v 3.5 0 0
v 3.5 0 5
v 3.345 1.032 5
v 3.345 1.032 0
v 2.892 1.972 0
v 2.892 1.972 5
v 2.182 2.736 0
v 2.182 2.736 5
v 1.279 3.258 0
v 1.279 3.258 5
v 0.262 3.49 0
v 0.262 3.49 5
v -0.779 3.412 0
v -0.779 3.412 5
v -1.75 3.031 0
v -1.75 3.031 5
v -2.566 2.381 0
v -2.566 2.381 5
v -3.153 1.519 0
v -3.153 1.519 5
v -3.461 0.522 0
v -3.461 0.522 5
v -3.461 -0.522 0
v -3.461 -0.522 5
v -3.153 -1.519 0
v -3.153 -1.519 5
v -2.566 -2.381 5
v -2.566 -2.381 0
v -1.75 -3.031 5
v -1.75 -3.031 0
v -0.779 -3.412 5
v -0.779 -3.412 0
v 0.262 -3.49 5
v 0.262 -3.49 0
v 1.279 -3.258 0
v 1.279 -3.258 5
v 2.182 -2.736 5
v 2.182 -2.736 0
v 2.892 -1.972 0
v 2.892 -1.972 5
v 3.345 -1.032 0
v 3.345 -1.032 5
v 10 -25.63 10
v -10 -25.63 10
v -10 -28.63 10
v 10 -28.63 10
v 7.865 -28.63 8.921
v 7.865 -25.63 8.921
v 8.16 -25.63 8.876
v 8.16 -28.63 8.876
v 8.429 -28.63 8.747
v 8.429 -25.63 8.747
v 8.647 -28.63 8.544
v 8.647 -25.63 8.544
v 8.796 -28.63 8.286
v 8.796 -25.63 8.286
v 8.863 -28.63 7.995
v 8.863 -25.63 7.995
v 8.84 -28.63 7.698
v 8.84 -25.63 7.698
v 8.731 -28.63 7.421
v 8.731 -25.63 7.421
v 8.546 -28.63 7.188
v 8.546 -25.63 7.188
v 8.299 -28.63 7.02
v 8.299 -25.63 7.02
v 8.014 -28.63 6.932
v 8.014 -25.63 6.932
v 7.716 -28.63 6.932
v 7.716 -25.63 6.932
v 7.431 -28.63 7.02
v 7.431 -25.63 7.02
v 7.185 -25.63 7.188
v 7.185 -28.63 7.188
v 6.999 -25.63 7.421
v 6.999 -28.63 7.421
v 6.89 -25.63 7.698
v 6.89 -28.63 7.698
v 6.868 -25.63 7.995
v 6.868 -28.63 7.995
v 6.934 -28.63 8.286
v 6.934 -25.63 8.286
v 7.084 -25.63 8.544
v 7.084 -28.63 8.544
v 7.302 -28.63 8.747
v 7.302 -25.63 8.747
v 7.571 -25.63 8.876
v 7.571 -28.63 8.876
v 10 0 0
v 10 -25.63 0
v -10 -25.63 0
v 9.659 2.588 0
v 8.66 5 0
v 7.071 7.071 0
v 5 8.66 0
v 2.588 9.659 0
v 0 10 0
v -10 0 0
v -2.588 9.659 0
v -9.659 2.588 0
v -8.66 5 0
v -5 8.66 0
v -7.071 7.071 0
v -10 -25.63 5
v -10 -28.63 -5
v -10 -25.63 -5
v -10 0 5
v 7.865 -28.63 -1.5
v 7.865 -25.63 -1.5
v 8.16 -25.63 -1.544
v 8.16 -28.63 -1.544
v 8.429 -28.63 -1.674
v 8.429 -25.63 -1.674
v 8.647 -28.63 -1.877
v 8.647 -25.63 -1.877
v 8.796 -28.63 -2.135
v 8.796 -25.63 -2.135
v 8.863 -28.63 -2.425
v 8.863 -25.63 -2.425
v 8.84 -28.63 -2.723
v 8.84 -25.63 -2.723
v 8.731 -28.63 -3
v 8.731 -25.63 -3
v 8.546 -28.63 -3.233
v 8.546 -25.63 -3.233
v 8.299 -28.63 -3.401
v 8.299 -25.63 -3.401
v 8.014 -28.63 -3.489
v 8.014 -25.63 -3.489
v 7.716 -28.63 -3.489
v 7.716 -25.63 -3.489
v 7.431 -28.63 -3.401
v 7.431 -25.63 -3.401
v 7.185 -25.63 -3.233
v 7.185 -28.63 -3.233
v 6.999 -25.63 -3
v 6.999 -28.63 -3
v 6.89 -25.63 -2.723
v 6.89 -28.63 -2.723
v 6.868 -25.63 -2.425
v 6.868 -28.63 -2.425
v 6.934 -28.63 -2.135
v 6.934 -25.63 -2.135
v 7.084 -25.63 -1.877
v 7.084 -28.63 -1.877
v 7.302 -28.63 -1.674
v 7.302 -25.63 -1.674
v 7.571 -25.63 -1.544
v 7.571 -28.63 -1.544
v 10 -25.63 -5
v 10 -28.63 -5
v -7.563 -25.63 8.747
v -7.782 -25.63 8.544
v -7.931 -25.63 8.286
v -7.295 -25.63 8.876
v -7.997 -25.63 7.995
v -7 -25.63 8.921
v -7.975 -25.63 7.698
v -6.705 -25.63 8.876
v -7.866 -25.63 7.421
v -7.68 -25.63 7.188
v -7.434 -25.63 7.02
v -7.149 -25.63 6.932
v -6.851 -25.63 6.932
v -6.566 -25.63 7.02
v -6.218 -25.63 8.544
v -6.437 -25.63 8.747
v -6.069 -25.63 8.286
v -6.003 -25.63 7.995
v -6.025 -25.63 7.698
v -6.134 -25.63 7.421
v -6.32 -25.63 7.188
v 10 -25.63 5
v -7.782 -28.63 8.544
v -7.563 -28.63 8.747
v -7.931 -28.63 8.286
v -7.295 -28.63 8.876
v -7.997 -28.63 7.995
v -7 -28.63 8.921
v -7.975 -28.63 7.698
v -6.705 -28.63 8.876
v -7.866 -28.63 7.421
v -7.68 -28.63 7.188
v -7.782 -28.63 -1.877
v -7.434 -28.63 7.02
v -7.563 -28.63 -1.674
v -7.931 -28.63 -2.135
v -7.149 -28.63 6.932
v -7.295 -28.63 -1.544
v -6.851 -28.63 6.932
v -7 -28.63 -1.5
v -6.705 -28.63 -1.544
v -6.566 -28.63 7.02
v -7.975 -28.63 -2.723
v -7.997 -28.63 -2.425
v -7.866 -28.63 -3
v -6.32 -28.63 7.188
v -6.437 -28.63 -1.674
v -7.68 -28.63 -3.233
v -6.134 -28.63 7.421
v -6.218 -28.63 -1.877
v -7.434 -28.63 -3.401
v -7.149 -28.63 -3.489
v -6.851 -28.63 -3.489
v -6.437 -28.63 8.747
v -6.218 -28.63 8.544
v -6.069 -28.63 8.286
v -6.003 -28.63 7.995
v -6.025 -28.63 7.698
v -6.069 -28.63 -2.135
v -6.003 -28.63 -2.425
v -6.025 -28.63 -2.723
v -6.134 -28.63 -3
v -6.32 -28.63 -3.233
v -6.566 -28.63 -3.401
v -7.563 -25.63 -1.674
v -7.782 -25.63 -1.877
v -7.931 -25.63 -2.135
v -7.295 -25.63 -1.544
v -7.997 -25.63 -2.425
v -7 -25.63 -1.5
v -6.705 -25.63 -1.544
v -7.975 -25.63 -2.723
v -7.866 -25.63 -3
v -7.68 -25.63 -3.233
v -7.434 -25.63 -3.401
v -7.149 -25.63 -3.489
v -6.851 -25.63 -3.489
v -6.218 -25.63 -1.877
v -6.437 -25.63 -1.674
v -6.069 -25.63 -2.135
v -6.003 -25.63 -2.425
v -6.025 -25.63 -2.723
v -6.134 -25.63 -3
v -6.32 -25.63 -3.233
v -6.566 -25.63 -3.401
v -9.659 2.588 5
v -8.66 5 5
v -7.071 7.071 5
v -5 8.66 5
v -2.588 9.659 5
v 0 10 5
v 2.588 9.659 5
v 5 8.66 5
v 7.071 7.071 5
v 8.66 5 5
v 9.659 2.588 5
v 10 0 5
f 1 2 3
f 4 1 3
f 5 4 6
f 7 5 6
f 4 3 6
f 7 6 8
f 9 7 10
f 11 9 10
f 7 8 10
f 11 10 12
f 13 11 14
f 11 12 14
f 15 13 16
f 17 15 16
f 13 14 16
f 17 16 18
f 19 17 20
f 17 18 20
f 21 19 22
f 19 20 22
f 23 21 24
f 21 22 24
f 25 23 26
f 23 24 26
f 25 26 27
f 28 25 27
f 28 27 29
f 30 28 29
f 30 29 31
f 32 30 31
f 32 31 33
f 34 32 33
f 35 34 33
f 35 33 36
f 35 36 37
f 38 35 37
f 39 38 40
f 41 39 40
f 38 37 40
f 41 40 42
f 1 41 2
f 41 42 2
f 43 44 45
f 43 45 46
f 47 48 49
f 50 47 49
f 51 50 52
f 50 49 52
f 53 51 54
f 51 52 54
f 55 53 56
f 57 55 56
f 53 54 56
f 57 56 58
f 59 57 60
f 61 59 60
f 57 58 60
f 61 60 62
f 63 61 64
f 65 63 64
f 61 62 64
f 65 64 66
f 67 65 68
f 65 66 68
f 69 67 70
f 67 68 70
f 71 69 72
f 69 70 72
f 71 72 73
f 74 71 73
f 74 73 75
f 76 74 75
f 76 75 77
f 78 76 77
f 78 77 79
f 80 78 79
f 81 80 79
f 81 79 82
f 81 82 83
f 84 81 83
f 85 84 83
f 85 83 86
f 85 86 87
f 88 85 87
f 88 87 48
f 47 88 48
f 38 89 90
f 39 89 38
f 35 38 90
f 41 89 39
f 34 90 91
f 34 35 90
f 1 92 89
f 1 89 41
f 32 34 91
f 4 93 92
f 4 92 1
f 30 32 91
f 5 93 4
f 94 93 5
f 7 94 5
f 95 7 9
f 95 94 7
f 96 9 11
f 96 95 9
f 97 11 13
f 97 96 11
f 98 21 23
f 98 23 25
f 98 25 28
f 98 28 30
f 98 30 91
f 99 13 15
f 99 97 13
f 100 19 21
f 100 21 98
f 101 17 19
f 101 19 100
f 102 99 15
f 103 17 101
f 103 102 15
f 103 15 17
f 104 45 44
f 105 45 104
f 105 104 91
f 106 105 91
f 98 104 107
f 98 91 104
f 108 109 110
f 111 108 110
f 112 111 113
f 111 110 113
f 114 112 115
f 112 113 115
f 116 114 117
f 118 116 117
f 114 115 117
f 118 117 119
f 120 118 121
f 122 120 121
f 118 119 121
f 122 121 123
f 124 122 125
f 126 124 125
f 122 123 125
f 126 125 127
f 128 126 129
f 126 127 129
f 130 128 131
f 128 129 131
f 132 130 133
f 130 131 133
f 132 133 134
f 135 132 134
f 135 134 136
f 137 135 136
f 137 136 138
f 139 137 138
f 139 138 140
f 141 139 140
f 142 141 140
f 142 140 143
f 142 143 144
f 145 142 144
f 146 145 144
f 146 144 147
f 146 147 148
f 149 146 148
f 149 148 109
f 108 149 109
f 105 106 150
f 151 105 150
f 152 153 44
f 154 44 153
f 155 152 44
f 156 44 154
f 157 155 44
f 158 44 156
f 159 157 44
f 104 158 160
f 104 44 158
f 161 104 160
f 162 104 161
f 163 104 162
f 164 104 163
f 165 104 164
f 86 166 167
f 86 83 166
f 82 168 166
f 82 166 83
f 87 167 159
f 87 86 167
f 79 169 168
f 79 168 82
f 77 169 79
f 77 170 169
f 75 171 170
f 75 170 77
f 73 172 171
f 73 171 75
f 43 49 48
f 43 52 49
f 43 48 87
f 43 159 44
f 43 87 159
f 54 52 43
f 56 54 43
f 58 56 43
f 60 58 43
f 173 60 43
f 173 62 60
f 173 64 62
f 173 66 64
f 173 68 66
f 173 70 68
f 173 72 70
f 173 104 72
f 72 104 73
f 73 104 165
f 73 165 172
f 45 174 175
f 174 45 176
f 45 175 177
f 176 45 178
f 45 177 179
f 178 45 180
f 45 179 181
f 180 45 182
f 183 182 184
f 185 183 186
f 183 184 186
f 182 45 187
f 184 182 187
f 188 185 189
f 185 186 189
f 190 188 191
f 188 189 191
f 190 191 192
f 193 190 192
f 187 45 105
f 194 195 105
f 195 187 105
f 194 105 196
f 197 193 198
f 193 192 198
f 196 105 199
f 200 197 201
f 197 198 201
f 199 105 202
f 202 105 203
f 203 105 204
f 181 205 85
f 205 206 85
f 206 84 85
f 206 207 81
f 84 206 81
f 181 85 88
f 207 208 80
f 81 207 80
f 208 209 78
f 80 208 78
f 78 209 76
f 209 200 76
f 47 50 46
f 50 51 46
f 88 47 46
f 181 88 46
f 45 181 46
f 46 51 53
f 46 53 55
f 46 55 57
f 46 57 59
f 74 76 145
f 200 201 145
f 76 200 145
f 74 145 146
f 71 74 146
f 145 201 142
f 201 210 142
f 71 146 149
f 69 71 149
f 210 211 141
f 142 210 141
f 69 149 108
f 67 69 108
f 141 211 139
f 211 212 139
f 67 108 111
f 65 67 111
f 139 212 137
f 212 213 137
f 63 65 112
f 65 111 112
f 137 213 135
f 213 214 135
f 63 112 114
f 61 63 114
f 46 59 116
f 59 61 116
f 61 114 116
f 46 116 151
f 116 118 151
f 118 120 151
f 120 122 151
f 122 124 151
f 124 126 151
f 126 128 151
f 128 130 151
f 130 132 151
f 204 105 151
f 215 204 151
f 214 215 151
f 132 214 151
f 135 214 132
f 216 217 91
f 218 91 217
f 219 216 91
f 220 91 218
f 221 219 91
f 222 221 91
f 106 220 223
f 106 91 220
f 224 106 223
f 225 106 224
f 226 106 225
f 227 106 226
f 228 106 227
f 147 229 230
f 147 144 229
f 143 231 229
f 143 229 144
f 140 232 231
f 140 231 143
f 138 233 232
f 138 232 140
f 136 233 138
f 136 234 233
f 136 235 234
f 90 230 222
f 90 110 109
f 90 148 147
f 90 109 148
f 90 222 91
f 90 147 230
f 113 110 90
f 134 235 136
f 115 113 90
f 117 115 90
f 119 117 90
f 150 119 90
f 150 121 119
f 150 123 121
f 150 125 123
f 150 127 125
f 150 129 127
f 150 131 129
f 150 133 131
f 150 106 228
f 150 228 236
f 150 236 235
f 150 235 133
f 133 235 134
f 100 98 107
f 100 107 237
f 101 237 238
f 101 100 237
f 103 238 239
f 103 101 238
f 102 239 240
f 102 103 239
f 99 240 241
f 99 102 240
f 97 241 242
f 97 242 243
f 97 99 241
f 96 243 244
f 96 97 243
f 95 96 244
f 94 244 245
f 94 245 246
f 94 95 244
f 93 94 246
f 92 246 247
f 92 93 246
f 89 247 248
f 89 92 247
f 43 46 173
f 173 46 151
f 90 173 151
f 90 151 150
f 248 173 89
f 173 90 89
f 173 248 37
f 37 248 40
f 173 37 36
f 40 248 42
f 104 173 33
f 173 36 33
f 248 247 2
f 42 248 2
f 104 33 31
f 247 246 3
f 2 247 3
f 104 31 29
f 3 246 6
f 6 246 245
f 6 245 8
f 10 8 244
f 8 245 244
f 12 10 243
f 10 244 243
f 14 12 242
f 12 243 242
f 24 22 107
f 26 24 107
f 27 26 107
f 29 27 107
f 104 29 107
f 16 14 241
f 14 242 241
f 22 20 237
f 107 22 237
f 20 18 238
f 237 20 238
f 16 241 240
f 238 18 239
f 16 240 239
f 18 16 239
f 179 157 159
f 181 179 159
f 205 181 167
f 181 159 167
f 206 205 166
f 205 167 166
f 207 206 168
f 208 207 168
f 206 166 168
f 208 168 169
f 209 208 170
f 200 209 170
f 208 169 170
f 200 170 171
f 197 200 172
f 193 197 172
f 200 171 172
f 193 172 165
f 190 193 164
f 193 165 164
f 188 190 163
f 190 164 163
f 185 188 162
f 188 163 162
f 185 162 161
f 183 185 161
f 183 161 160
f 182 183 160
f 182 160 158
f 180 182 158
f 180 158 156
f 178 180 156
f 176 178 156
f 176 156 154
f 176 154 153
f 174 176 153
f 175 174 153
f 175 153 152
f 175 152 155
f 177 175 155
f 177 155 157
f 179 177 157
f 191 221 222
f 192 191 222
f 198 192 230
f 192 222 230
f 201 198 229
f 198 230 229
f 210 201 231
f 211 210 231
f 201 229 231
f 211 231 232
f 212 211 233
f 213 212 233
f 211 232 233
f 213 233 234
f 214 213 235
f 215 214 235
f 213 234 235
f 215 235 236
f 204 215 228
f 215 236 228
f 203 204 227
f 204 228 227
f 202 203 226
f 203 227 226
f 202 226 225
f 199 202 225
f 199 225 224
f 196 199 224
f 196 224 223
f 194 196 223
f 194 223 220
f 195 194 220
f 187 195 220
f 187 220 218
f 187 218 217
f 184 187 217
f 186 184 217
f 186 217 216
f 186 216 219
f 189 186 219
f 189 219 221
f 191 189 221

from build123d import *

# Parameters (mm, degrees)
BOSS_EXTRU_1_DEPTH      = 5
ESQUISSE2_R             = 3.5
ENL_V_MAT_EXTRU_1_DEPTH = 5
BOSS_EXTRU_2_DEPTH      = 5
BOSS_EXTRU_2_DEPTH_BACK = 10
ESQUISSE3_W             = 20
ESQUISSE3_H             = 3
ESQUISSE4_R             = 1
ENL_V_MAT_EXTRU_2_DEPTH = 5


with BuildPart() as part:
    # Esquisse1 → Boss.-Extru.1 (new body)
    with BuildSketch(Plane.XY):
        with BuildLine():
            Line((-10, -28.63), (-10, 0))
            ThreePointArc((-10, 0), (0, 10), (10, 0))
            Line((10, 0), (10, -28.63))
            Line((10, -28.63), (-10, -28.63))
        make_face()
    extrude(amount=BOSS_EXTRU_1_DEPTH)

    # Esquisse2 → Enlèv. mat.-Extru.1 (cut)
    with BuildSketch(Plane.XY.offset(5)):
        Circle(ESQUISSE2_R)
    extrude(amount=-ENL_V_MAT_EXTRU_1_DEPTH, mode=Mode.SUBTRACT)

    # Esquisse3 → Boss.-Extru.2 (add, two sides: drawn at the far end of the back side and taken through both)
    with BuildSketch(Plane.XY.offset(5).offset(-BOSS_EXTRU_2_DEPTH_BACK)):
        with Locations((0, -27.13)):
            Rectangle(ESQUISSE3_W, ESQUISSE3_H)
    extrude(amount=BOSS_EXTRU_2_DEPTH + BOSS_EXTRU_2_DEPTH_BACK)

    # Esquisse4 → Enlèv. mat.-Extru.2 (cut)
    with BuildSketch(Plane(origin=(0, -25.63, 0), x_dir=(1, 0, 0), z_dir=(0, 1, 0))):
        with Locations(Location((-7, -7.92068908, 0), (0, 0, 270))):
            Circle(ESQUISSE4_R)
        with Locations(Location((7.865355749, -7.92068908, 0), (0, 0, 270))):
            Circle(ESQUISSE4_R)
        with Locations(Location((7.865355749, 2.5, 0), (0, 0, 270))):
            Circle(ESQUISSE4_R)
        with Locations(Location((-7, 2.5, 0), (0, 0, 270))):
            Circle(ESQUISSE4_R)
    extrude(amount=-ENL_V_MAT_EXTRU_2_DEPTH, mode=Mode.SUBTRACT)


solid = part.part
